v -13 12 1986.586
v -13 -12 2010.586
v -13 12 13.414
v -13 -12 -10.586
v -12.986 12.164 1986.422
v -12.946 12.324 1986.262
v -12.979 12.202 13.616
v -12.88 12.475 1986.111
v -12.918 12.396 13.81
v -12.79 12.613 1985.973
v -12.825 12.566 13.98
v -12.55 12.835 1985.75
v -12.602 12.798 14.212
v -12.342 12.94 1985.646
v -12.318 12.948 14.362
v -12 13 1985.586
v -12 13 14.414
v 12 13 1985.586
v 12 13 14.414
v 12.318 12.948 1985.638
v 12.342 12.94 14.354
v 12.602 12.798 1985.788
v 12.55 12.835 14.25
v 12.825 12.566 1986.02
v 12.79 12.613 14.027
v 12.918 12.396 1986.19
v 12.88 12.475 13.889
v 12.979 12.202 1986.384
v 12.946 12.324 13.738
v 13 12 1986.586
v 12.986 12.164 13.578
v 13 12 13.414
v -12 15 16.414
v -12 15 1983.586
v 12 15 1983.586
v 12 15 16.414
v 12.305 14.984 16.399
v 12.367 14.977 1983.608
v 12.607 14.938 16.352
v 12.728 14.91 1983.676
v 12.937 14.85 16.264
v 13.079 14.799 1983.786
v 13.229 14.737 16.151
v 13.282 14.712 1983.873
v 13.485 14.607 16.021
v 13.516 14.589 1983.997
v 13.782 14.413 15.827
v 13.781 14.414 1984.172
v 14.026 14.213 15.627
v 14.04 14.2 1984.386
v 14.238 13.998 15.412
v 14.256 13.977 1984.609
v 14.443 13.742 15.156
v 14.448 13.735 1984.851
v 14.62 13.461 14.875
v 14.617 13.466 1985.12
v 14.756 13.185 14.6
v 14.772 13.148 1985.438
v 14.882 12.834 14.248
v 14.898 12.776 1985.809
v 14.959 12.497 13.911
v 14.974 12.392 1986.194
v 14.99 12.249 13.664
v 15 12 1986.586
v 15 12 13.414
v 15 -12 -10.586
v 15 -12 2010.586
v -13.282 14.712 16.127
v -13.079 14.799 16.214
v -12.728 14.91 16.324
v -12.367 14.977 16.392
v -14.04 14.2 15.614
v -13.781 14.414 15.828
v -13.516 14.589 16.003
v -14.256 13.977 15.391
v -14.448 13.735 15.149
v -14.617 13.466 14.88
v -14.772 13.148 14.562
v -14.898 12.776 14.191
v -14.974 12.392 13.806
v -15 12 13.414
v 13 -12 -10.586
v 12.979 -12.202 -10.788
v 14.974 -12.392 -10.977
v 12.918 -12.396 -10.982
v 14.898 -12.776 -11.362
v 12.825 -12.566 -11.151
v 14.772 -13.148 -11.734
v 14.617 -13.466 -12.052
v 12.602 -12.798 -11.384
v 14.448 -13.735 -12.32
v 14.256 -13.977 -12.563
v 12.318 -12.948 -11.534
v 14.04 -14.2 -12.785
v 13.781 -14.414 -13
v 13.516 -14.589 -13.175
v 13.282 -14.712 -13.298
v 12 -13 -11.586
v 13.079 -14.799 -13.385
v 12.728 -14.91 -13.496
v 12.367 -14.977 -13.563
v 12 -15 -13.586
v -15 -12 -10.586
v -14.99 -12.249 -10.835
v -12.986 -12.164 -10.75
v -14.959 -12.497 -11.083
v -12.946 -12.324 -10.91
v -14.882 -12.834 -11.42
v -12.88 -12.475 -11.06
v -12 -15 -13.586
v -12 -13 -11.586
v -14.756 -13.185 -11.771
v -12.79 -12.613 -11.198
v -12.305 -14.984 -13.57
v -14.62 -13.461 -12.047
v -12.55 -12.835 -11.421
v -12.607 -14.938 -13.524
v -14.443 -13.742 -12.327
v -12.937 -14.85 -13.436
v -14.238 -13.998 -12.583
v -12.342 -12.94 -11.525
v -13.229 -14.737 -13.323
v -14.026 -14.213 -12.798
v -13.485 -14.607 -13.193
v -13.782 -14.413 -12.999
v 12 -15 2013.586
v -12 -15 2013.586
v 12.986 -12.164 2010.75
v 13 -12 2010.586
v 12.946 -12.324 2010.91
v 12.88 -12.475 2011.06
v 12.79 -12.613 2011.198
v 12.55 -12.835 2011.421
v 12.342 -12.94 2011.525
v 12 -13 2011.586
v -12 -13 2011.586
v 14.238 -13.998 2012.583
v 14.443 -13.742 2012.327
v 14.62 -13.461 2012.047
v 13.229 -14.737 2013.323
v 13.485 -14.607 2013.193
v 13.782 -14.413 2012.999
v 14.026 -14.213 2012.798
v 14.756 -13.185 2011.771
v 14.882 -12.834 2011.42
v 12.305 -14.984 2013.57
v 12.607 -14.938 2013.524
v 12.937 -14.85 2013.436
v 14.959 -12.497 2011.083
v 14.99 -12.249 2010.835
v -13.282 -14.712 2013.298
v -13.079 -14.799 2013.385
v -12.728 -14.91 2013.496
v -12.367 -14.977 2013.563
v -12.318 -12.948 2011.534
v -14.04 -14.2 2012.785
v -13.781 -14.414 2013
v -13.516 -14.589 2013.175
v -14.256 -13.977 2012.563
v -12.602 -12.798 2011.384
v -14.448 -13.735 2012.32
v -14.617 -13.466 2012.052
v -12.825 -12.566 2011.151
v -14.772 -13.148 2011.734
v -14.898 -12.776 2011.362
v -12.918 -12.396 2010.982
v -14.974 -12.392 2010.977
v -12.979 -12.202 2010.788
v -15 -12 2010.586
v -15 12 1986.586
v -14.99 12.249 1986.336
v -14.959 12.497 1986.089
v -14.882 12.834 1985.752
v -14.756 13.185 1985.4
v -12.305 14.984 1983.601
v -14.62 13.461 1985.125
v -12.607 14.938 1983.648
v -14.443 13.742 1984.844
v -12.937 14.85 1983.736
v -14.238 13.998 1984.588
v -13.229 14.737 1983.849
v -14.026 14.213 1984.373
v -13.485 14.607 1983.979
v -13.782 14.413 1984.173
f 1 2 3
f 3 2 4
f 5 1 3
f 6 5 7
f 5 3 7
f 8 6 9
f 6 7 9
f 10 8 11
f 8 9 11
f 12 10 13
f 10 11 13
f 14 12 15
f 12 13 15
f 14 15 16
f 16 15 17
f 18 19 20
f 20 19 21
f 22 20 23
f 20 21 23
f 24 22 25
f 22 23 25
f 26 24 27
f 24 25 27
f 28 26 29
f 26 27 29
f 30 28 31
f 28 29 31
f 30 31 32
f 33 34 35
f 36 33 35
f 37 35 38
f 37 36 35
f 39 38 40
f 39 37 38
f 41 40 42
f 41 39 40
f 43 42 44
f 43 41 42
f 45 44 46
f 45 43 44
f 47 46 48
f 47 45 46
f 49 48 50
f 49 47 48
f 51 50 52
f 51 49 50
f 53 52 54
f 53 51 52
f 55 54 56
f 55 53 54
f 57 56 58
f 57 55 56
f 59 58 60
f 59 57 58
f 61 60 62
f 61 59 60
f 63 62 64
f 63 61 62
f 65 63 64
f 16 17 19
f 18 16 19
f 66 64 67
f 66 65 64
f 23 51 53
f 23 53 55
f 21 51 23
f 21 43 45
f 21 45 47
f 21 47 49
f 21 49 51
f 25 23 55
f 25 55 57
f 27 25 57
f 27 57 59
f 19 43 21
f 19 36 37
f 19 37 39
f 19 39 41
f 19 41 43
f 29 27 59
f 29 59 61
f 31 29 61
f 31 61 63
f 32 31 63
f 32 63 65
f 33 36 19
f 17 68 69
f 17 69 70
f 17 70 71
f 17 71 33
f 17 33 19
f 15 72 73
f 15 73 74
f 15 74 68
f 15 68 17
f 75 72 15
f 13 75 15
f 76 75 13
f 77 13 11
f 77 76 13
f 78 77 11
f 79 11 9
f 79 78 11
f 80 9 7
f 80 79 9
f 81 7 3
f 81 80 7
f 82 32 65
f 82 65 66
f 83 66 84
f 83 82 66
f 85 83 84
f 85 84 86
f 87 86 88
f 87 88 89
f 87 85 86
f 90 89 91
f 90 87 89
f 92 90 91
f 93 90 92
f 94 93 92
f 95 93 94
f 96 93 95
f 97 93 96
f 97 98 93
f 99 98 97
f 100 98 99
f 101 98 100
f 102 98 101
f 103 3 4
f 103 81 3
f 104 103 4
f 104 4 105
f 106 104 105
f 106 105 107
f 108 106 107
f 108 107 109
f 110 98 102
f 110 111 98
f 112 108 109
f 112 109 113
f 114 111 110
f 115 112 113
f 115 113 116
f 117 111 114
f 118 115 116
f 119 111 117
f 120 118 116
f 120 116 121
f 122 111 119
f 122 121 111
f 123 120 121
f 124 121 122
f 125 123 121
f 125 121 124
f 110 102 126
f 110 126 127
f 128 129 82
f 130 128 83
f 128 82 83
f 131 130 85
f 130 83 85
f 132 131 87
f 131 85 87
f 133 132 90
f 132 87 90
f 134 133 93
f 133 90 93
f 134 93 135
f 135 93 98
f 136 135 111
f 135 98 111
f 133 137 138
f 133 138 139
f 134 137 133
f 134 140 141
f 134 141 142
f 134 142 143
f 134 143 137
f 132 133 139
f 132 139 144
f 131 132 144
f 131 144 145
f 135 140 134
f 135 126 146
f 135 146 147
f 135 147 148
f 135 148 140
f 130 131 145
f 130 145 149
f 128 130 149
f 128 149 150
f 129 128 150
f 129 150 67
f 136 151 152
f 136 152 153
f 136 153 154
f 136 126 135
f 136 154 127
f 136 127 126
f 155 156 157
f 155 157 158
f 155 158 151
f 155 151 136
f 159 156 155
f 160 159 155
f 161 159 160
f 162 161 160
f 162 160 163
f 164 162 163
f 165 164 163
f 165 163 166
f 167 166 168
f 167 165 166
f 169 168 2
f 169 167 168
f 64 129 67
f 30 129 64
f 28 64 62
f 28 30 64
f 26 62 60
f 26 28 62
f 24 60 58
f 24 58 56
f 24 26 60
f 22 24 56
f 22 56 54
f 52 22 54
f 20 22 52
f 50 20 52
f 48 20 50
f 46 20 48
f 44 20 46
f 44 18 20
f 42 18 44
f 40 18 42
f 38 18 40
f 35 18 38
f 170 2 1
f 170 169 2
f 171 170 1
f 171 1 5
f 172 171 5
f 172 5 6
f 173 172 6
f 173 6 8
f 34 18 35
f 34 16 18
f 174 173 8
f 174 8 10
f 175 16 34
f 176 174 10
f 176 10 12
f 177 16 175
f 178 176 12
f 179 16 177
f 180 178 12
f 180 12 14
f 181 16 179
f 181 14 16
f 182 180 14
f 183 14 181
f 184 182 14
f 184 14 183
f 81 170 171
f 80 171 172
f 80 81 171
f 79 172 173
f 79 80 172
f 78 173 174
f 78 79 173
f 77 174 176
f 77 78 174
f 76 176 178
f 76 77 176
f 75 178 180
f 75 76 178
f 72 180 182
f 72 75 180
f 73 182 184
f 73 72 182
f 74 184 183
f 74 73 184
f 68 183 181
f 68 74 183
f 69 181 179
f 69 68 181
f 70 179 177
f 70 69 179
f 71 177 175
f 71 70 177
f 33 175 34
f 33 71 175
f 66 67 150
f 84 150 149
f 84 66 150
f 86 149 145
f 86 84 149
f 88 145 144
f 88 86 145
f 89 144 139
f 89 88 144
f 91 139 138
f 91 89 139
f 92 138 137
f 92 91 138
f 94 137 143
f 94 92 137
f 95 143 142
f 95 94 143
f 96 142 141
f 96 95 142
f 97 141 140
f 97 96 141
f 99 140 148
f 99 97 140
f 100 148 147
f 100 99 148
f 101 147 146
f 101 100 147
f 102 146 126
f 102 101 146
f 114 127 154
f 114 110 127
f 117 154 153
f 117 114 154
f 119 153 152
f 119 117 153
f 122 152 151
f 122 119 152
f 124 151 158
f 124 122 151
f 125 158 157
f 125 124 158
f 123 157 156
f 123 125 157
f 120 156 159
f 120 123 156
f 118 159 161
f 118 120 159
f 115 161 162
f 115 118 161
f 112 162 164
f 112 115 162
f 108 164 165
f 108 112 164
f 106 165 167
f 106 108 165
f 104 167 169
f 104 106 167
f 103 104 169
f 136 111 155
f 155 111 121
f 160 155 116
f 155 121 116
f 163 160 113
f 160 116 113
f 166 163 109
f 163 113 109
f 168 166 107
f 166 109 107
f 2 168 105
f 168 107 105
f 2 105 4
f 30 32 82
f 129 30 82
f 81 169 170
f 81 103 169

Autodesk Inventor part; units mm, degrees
ref_plane "Start Plane" through (0, 0, -13.5858) normal (0, 0, 1) x (1, 0, 0)
ref_plane "End Plane" through (0, 0, 2013.5858) normal (0, 0, 1) x (1, 0, 0)
sketch "Sketch" plane through (0, 0, 0) normal (0, 0, 1) x (1, 0, 0)
  line L0 (-15, -12) -> (-15, 12)
  line L1 (-12, 15) -> (12, 15)
  line L2 (15, 12) -> (15, -12)
  line L3 (12, -15) -> (-12, -15)
  arc A0 (-15, -12) -> (-12, -15) centre (-12, -12) ccw
  arc A1 (-12, 15) -> (-15, 12) centre (-12, 12) ccw
  arc A2 (15, 12) -> (12, 15) centre (12, 12) ccw
  arc A3 (12, -15) -> (15, -12) centre (12, -12) ccw
  arc A4 (-12, 13) -> (-13, 12) centre (-12, 12) ccw
  line L4 (-12, 13) -> (12, 13)
  arc A5 (13, 12) -> (12, 13) centre (12, 12) ccw
  line L5 (13, 12) -> (13, -12)
  arc A6 (12, -13) -> (13, -12) centre (12, -12) ccw
  line L6 (12, -13) -> (-12, -13)
  arc A7 (-13, -12) -> (-12, -13) centre (-12, -12) ccw
  line L7 (-13, -12) -> (-13, 12)
  line L8 (0, 21.8698) -> (0, -21.8698) construction
  line L9 (-21.8698, 0) -> (21.8698, 0) construction
  dimension "d7" = 3
  dimension "d10" = 30
  dimension "d11" = 30
  dimension "d12" = 2
  dimension "d15" = 15
  dimension "d16" = 15
extrude "Body" add sketch "Sketch" along normal up to surface (2027.1716 mm away) from surface at -13.5858
sketch "Sketch3" plane through (0, 0, 0) normal (0, 0, 1) x (1, 0, 0)
  line L0 (0, 0) -> (10, 0)
ref_plane "Work Plane3" through (0, 0, 0) normal (0, -1, 0) x (1, 0, 0)
ref_plane "Work Plane4" through (0, -15.7071, 2014.2929) normal (0, 0.7071, 0.7071) x (1, 0, 0)
split "Split1" plane through (0, -15.7071, 2014.2929) removes the side toward (0, 0.7071, 0.7071)
ref_plane "Work Plane5" through (0, -15.7071, -14.2929) normal (0, 0.7071, -0.7071) x (1, 0, 0)
split "Split2" plane through (0, -15.7071, -14.2929) removes the side toward (0, 0.7071, -0.7071)
sketch "Sketch4" plane through (0, 0, 0) normal (0, -1, 0) x (1, 0, 0)
  line L0 (-2, -13.5858) -> (12, -13.5858) projected
  line L1 (-2, 2013.5858) -> (12, 2013.5858) projected
  dimension "d18" = 2027.1716
equation "\"d7\" = G_IR"
equation "\"d10\" = G_H"
equation "\"d11\" = G_W"
equation "\"d12\" = G_T"
equation "\"d15\" = 0.5 * d10"
equation "\"d16\" = 0.5 * d11"
equation "\"d3\" = G_L"
equation "\"G_W\" = 30"
equation "\"G_H\" = 30"
equation "\"G_T\" = 2"
equation "\"G_IR\" = 3"
equation "\"G_L\" = d18"
equation "\"G_OFFSET_START\" = 13.58579"
equation "\"G_OFFSET_END\" = 13.58579"
equation "\"d13\" = -G_OFFSET_START"
equation "\"d14\" = G_OFFSET_END + B_L"
equation "\"B_L\" = 2000"
properties part number "ISO 12633-2 - 30x30x2 - 2027,17" material "Steel, Mild"
